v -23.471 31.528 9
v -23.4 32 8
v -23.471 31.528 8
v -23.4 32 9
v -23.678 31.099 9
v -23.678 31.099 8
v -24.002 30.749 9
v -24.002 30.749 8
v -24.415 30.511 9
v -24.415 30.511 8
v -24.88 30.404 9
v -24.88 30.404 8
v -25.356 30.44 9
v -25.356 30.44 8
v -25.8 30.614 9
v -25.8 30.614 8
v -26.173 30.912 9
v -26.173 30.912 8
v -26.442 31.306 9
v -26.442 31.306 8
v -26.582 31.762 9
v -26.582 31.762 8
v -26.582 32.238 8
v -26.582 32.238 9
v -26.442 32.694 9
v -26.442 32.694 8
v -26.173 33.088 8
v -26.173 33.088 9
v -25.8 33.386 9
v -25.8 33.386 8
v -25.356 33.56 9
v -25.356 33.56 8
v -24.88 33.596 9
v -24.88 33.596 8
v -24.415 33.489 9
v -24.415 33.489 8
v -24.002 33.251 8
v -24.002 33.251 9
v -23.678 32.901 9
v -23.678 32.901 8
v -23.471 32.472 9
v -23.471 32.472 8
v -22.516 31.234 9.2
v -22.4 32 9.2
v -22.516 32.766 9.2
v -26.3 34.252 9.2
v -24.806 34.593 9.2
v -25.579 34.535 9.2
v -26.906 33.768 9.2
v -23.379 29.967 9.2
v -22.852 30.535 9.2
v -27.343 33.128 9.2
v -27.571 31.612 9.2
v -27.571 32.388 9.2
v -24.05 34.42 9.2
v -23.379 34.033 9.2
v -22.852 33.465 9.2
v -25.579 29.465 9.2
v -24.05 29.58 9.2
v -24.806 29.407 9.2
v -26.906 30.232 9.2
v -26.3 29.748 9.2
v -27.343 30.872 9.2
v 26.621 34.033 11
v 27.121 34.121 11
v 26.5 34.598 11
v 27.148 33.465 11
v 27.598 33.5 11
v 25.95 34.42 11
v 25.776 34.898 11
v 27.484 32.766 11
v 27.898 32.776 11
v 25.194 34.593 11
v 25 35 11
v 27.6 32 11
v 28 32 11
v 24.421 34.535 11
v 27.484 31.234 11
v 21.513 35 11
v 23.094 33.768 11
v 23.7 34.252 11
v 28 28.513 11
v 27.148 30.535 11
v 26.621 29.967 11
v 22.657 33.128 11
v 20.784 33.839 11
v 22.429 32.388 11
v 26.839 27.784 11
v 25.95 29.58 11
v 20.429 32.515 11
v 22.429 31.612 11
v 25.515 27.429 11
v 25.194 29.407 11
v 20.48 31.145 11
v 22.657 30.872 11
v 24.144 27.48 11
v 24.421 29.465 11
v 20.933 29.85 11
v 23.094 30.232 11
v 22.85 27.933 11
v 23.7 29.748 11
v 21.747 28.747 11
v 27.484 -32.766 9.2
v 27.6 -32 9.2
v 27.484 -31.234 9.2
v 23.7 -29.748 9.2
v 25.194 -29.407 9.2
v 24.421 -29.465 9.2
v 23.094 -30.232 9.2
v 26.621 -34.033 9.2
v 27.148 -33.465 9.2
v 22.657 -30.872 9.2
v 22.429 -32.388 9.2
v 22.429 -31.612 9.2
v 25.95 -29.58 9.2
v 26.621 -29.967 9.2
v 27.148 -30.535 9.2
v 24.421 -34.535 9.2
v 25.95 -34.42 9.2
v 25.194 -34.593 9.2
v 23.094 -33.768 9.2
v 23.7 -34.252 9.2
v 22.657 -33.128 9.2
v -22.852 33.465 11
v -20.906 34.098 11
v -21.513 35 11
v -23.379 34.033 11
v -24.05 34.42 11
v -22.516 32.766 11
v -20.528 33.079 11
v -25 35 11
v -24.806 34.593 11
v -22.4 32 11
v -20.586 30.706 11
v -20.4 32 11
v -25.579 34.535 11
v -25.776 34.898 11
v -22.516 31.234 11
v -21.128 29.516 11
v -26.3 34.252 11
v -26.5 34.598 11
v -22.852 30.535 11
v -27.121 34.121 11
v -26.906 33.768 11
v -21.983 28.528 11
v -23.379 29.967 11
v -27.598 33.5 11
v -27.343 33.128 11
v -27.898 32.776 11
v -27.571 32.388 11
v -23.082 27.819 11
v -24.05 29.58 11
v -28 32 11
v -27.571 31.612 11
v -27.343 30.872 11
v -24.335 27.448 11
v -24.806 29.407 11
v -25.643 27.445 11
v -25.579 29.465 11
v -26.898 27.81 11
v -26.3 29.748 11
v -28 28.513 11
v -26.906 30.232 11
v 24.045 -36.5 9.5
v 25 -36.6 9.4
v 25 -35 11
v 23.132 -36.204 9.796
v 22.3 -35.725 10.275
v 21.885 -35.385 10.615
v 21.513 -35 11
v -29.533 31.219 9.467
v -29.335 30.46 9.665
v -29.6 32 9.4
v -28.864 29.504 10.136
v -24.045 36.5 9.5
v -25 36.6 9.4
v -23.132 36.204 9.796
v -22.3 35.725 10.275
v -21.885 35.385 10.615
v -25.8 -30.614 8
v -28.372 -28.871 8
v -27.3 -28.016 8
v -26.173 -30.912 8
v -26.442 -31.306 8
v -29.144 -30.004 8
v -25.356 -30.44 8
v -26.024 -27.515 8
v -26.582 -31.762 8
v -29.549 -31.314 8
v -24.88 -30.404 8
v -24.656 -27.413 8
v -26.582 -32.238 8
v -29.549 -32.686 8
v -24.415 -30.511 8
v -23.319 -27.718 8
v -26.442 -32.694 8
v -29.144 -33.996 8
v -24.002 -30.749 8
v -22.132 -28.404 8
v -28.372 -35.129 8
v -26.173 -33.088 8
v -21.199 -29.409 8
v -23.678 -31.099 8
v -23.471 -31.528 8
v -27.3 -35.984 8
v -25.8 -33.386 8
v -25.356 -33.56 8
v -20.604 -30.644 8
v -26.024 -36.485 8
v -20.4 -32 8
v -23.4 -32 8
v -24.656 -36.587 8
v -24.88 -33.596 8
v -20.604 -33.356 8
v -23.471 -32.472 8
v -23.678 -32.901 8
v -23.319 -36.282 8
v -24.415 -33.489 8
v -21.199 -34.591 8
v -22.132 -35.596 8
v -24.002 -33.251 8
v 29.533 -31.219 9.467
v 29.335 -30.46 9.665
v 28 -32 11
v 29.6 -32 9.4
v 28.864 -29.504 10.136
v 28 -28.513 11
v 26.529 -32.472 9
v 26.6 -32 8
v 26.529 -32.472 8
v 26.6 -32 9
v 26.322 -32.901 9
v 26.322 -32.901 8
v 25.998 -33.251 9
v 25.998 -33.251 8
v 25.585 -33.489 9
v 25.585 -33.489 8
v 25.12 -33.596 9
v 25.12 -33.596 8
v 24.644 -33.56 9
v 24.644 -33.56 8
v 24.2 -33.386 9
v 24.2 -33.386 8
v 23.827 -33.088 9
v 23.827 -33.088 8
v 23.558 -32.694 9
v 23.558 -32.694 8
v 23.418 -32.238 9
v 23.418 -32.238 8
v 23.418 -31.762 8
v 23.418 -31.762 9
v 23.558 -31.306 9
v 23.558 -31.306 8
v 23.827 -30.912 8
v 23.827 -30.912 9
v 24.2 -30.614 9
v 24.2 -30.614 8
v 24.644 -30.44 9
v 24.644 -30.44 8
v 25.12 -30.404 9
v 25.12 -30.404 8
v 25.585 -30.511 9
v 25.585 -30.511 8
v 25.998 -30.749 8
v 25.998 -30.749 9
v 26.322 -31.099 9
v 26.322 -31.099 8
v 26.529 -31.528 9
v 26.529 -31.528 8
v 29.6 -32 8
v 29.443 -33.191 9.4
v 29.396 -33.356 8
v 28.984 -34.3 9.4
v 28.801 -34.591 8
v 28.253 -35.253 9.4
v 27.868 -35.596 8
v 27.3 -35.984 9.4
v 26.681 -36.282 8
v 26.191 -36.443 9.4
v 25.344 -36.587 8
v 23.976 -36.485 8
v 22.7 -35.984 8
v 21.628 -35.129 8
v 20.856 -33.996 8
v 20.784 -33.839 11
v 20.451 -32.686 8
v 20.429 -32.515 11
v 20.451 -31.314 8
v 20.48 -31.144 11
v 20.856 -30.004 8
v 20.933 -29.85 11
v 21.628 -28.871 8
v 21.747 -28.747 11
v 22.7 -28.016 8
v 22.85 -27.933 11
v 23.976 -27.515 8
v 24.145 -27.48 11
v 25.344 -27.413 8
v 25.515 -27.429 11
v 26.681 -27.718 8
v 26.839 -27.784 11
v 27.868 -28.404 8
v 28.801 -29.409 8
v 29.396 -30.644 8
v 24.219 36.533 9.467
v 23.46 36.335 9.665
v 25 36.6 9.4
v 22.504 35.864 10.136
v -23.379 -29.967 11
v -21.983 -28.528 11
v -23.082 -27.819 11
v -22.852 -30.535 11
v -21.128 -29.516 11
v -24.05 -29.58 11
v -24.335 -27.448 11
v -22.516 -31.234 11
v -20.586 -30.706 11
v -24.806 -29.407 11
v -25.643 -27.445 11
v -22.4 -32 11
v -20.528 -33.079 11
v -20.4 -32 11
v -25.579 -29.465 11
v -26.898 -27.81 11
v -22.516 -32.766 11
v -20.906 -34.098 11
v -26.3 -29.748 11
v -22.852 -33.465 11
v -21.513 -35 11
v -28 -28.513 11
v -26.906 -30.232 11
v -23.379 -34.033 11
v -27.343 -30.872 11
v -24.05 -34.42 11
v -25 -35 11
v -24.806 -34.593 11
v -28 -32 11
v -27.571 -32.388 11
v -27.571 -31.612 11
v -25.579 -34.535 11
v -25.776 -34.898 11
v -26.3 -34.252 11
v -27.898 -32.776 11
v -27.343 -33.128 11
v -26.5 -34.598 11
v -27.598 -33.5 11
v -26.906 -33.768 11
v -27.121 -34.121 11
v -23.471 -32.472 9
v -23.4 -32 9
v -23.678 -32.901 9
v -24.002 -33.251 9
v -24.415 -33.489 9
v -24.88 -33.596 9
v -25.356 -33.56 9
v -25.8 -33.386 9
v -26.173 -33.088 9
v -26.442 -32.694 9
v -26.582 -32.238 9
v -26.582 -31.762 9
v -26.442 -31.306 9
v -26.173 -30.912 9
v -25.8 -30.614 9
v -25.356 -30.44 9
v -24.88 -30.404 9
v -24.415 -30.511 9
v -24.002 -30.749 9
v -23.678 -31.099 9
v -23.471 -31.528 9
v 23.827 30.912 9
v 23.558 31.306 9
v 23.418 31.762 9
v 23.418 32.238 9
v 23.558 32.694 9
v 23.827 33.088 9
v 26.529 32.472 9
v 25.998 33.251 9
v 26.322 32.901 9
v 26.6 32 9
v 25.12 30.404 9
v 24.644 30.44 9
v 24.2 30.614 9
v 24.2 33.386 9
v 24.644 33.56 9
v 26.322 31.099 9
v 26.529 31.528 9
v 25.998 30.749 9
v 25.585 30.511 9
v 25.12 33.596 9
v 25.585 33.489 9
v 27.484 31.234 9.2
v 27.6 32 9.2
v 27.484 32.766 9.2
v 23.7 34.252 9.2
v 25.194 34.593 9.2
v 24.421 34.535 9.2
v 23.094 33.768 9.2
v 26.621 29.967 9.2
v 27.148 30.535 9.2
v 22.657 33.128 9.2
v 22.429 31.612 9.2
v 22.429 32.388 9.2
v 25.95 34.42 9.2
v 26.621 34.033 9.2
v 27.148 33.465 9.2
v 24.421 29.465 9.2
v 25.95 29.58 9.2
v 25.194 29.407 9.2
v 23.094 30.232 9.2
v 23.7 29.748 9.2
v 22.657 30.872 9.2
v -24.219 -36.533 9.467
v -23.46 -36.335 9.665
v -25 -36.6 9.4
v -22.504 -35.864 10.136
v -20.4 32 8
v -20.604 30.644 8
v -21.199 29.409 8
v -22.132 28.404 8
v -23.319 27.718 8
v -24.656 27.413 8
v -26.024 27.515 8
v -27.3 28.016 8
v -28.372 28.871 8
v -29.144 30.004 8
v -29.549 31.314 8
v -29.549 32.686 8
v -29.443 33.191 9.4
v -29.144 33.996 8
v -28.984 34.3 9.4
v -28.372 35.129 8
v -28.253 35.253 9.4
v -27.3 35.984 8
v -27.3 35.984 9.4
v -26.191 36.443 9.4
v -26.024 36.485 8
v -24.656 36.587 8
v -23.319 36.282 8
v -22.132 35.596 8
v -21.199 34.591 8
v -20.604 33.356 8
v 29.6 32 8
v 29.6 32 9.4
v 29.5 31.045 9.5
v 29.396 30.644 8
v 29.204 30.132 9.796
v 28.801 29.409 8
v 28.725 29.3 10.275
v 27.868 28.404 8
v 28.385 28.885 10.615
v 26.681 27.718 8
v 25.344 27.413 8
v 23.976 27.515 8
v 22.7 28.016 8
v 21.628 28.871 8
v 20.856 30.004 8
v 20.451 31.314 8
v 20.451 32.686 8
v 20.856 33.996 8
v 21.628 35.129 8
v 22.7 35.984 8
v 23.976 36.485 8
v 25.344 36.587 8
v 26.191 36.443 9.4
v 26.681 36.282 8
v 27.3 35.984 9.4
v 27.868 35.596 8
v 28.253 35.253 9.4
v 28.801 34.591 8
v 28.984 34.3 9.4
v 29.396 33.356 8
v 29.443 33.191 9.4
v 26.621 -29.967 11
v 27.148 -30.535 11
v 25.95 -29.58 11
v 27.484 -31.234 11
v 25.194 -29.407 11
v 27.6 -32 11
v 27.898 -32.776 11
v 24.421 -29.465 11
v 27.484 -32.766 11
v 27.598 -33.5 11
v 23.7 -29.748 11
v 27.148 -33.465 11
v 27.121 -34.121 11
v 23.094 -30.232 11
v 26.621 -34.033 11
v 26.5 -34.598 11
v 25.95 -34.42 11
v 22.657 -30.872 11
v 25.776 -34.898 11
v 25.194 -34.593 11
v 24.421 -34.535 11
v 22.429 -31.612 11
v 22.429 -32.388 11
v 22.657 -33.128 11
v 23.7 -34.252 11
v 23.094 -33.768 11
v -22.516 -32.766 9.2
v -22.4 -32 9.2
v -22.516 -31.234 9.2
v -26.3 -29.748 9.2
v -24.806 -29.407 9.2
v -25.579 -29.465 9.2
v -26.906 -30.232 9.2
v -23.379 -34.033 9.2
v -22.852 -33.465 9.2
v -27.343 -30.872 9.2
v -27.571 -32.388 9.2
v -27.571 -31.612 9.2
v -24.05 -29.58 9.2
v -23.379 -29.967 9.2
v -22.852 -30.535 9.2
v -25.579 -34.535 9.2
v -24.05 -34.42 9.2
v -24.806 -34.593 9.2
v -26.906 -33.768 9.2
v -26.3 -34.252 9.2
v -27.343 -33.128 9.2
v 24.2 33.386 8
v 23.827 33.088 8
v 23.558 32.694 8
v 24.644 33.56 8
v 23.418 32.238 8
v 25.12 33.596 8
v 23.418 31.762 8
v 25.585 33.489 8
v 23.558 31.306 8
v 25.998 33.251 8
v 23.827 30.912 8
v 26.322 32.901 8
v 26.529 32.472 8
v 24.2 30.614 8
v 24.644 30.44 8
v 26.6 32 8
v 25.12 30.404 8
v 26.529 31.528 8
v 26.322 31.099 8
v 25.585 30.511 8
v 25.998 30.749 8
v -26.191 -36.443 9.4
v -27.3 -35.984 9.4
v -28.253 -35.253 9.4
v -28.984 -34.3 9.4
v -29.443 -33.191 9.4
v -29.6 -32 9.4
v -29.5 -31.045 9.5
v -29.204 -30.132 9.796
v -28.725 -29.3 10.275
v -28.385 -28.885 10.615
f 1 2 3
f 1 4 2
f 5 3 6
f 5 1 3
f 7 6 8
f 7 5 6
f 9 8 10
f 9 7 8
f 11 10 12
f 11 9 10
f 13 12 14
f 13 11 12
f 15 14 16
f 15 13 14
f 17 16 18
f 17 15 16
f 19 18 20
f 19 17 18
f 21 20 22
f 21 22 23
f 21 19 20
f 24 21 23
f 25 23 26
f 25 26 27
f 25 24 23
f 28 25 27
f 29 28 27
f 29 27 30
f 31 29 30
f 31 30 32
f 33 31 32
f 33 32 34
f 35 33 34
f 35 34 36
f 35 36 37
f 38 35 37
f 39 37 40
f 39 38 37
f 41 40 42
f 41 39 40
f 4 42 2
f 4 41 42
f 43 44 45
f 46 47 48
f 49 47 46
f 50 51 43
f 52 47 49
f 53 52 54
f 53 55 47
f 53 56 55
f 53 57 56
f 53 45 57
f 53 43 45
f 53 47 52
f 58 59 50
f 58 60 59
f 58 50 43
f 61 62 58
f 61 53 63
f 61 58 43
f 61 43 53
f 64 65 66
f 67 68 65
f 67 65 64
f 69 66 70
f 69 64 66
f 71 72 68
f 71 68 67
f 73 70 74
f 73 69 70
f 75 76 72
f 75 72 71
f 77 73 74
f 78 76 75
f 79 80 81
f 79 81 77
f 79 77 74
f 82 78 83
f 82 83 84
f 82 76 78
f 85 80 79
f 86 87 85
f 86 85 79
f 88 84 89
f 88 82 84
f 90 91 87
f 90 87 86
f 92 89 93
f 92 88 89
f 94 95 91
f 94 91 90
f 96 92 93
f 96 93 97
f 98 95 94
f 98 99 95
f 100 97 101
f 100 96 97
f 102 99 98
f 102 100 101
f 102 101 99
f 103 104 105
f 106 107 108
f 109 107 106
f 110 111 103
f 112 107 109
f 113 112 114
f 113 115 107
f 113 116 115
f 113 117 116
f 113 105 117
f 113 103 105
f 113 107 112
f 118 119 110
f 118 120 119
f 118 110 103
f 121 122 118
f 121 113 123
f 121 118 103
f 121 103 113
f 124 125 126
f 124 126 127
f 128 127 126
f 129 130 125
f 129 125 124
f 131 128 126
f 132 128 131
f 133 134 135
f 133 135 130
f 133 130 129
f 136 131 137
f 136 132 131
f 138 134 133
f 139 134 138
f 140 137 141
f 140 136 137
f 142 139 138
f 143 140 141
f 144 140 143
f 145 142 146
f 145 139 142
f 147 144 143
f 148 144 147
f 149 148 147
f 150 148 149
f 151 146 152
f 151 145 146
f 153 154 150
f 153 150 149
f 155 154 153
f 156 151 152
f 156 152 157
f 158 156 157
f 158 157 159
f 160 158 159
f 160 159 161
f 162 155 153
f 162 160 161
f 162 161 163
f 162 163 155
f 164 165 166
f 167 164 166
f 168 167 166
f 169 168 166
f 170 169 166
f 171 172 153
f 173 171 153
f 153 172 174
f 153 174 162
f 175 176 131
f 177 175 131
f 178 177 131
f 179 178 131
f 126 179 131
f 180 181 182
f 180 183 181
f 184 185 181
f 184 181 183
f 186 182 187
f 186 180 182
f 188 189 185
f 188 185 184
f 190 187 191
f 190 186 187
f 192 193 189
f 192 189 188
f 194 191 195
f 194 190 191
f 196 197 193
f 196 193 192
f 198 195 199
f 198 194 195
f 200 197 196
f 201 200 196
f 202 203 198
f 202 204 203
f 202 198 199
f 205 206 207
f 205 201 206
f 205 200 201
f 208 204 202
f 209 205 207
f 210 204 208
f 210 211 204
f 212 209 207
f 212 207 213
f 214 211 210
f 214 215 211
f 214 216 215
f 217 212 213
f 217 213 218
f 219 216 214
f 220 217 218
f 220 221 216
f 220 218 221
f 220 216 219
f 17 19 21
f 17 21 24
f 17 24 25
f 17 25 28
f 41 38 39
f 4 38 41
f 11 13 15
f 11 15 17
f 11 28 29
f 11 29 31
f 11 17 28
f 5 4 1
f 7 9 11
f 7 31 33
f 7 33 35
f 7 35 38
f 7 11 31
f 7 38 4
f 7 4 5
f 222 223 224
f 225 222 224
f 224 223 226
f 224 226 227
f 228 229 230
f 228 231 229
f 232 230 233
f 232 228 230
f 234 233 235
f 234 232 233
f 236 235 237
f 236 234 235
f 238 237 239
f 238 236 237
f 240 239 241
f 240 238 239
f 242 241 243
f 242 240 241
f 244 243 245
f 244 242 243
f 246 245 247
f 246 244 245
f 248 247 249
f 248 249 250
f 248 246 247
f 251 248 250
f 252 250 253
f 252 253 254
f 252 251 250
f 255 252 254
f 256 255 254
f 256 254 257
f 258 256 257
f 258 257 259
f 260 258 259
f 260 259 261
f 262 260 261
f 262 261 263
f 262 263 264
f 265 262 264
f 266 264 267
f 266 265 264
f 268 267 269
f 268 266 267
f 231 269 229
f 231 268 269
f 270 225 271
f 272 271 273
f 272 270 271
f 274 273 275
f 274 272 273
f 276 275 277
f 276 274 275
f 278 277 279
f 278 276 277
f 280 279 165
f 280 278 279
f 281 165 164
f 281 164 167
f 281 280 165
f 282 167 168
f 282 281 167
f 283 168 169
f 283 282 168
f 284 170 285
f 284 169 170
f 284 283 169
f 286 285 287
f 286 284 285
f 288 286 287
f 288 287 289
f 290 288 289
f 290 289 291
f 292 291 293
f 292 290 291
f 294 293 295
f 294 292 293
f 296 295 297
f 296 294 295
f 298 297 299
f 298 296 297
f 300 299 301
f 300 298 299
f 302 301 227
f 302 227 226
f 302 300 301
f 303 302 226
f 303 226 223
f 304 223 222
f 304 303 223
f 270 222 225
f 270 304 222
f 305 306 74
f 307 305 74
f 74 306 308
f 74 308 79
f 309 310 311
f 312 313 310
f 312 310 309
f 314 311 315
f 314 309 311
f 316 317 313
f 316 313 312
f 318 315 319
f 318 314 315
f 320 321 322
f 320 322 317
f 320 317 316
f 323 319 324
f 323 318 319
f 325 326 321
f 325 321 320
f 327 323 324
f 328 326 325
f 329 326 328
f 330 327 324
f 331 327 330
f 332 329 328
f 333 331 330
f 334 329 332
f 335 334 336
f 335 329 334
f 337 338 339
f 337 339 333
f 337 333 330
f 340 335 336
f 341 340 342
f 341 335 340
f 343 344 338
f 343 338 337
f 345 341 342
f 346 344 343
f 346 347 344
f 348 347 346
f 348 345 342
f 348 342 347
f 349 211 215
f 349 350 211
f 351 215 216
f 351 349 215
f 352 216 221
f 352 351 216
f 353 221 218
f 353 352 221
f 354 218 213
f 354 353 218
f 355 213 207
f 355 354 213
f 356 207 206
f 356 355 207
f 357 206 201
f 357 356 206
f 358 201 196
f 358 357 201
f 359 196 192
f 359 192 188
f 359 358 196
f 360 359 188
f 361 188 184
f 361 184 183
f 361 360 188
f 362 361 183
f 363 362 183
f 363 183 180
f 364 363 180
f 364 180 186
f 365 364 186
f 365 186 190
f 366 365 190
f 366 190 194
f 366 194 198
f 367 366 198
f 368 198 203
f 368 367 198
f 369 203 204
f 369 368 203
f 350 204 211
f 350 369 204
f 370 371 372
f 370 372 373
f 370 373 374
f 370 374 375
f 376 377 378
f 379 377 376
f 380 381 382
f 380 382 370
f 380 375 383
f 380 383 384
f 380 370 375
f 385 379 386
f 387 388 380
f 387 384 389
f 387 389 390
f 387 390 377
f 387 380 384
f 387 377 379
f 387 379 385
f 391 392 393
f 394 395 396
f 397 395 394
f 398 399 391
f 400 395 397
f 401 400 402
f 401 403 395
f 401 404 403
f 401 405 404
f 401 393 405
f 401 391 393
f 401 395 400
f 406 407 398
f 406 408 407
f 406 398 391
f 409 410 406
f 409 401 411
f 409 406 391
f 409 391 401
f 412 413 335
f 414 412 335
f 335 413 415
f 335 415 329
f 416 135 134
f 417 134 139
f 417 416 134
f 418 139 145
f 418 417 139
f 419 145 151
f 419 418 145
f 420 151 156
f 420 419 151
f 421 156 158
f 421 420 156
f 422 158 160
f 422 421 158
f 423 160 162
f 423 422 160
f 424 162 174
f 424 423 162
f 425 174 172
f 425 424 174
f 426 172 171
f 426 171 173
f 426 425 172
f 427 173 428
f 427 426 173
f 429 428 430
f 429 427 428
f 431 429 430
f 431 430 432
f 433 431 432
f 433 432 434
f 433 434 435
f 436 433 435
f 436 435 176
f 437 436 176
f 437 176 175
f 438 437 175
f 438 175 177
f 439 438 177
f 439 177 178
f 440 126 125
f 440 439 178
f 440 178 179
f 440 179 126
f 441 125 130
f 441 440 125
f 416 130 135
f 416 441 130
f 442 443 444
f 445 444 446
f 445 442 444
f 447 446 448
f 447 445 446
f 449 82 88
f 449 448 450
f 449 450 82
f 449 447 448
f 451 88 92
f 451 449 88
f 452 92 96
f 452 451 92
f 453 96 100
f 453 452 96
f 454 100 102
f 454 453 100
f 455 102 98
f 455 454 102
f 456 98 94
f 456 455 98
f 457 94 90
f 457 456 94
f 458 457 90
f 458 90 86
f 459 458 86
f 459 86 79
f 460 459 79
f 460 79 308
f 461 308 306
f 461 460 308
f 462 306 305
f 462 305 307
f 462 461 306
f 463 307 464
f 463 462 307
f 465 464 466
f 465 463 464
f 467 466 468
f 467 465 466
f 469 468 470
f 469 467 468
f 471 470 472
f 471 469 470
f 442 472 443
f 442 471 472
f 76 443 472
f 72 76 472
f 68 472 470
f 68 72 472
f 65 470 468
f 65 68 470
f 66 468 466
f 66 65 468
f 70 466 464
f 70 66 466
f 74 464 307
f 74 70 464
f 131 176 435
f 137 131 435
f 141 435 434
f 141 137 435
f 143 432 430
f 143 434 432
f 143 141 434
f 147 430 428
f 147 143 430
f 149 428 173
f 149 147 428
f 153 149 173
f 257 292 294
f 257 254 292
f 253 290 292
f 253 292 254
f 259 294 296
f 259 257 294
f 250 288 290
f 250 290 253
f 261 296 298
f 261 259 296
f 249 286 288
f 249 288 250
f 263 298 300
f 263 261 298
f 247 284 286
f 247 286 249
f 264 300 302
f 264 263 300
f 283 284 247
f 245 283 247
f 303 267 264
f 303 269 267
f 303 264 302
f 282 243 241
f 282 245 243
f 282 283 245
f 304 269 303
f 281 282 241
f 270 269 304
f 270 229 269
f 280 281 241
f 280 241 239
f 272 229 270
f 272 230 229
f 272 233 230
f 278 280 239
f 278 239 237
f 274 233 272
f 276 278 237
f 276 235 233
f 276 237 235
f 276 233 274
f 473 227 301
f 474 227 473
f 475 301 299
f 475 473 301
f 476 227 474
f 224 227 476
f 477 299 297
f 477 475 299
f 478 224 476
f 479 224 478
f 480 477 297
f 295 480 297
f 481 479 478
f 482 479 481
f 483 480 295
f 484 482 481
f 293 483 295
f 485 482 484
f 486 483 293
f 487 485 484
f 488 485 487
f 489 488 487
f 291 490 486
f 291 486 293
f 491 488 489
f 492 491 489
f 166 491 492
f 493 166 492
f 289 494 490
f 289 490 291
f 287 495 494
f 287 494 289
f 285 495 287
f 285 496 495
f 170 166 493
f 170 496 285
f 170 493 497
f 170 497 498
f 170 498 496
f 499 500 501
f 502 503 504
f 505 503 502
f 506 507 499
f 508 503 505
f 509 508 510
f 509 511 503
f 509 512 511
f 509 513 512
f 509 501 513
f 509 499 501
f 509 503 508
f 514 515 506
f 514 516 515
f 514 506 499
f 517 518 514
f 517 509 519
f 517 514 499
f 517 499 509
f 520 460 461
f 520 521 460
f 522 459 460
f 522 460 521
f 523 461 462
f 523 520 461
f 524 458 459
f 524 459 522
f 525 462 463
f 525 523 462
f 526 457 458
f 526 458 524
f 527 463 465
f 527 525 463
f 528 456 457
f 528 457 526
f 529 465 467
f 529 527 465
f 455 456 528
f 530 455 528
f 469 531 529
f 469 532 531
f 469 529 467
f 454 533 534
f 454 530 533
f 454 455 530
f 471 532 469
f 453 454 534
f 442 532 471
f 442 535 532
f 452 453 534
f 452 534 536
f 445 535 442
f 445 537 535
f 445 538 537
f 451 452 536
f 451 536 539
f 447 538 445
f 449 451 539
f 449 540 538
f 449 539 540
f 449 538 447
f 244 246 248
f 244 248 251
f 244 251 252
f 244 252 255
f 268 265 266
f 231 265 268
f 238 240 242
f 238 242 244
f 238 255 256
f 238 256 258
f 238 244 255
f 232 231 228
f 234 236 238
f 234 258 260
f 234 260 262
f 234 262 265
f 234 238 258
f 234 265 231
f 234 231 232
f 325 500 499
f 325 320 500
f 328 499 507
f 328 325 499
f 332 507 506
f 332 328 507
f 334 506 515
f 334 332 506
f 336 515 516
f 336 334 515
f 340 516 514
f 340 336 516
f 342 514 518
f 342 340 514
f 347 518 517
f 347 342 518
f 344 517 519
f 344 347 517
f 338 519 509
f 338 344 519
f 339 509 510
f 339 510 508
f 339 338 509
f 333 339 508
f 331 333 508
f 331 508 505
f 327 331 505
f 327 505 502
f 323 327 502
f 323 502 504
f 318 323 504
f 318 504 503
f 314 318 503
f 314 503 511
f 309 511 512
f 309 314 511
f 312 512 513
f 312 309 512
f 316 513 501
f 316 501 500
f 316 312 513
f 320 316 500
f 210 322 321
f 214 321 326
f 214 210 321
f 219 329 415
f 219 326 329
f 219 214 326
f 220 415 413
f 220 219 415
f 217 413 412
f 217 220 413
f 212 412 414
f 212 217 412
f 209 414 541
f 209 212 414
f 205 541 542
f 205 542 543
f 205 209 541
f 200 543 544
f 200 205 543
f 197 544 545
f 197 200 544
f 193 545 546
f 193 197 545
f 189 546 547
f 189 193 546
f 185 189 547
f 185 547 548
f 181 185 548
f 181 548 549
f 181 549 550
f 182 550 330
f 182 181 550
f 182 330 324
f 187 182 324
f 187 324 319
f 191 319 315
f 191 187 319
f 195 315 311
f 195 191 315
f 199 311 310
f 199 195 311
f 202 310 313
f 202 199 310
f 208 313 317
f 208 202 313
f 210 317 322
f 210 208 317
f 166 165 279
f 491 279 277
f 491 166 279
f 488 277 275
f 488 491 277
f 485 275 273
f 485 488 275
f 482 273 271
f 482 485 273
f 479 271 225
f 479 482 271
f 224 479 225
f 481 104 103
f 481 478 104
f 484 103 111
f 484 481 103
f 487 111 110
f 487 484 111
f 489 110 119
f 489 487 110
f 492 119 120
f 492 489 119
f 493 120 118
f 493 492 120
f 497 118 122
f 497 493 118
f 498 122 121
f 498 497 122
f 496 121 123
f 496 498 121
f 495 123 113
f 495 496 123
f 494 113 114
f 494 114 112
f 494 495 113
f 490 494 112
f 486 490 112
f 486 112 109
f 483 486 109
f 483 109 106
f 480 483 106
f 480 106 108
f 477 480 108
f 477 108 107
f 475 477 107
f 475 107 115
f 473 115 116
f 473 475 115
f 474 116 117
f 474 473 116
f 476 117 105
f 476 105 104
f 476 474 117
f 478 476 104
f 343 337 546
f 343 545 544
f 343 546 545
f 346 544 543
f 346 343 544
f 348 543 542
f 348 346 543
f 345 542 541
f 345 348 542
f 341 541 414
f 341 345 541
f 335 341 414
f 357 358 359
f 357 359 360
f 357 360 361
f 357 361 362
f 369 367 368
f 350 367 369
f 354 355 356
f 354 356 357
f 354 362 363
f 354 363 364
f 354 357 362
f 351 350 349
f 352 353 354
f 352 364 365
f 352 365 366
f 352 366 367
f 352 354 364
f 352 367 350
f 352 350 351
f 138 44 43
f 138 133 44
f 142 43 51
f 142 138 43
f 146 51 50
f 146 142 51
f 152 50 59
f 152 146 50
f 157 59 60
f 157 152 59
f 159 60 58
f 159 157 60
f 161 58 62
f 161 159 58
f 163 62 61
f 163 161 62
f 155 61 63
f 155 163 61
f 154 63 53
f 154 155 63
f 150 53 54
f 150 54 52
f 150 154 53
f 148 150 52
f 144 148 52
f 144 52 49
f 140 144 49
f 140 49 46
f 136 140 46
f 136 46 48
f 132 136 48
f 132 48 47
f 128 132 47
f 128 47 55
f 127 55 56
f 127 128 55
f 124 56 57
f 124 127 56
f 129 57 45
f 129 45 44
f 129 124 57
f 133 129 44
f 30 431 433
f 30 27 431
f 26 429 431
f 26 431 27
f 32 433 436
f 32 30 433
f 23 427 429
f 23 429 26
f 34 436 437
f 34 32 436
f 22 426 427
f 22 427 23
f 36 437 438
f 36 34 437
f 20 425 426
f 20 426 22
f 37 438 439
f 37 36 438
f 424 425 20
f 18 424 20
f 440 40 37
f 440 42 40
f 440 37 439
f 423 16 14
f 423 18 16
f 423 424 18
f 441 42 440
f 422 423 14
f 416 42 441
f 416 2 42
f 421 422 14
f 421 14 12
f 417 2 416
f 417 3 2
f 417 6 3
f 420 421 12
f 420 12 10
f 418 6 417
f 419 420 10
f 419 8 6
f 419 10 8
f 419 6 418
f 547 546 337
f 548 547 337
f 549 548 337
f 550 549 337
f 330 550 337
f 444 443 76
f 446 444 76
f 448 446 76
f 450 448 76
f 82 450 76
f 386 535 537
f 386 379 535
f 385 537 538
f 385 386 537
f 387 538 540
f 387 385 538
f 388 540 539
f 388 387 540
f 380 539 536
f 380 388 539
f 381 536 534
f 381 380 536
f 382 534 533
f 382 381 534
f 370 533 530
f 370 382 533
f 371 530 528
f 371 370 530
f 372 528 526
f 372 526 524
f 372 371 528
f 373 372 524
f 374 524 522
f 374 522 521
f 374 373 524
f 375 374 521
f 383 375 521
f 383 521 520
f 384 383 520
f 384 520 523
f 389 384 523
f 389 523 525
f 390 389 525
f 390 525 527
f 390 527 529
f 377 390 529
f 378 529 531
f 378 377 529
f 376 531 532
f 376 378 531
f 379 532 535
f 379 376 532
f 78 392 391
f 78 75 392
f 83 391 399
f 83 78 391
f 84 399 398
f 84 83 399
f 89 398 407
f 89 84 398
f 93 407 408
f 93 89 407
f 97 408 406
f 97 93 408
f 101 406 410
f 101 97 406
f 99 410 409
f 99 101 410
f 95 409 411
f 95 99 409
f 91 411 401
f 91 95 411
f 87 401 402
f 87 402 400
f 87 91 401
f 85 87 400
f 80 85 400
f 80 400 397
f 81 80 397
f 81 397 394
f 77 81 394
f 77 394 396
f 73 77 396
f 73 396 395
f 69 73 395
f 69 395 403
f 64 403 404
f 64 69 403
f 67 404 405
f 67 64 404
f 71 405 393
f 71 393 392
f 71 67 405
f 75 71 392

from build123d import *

# Parameters (mm, degrees)
REVOLVE_PLACEMENT_ANGLE = 180


with BuildPart() as bevel005:
    # Sweep002: sweep along a path in Sketch041
    with BuildLine(Plane(origin=(0, 0, -2), x_dir=(1, 0, 0), z_dir=(0, 0, -1))) as sweep002_path:
        Line((-25, 35), (25, 35))
        ThreePointArc((25, 35), (27.12132, 34.12132), (28, 32))
        Line((28, 32), (28, -32))
        ThreePointArc((28, -32), (27.12132, -34.12132), (25, -35))
        Line((25, -35), (-25, -35))
        ThreePointArc((-25, -35), (-27.12132, -34.12132), (-28, -32))
        Line((-28, -32), (-28, 32))
        ThreePointArc((-28, 32), (-27.12132, 34.12132), (-25, 35))
    # Sketch040 → Sweep002 (sweep)
    with BuildSketch(Plane.XZ):
        Polygon((-28, 11), (-30, 9), (-30, 1), (-28, -1), (-28, -2), (-33, -2), (-33, 12), (-28, 12), align=None)
    sweep(path=sweep002_path.line)


with BuildPart() as screw_hole_bottom:
    # Sketch033 → Revolve (revolve)
    with BuildSketch(Plane.XZ):
        Polygon((1.6, 3), (1.6, 2), (0, 2), (0, 1.8), (2.6, 1.8), (2.6, 0), (4.6, 0), (4.6, 3), align=None)
    revolve(axis=Axis((0, 0, 0), (0, 0, 1)))


with BuildPart() as screw_hole_bottom_1:
    # Revolve placement: moved
    add(screw_hole_bottom.part.moved(Location((-25, 32, 11))).rotate(Axis((-25, 32, 11), (1, 0, 0)), REVOLVE_PLACEMENT_ANGLE))


with BuildPart() as screw_hole_bottom002:
    # Body012 base: copy of screw hole bottom
    add(screw_hole_bottom_1.part)


with BuildPart() as screw_hole_bottom002_1:
    # Clone012 placement: moved
    add(screw_hole_bottom002.part.moved(Location((25, -32, 0))))


with BuildPart() as screw_hole_bottom002_2:
    # Body012 placement: moved
    add(screw_hole_bottom002_1.part.moved(Location((-25, -32, 0))))


with BuildPart() as screw_hole_bottom001:
    # Body011 base: copy of screw hole bottom
    add(screw_hole_bottom_1.part)


with BuildPart() as screw_hole_bottom001_1:
    # Clone011 placement: moved
    add(screw_hole_bottom001.part.moved(Location((25, -32, 0))))


with BuildPart() as screw_hole_bottom001_2:
    # Body011 placement: moved
    add(screw_hole_bottom001_1.part.moved(Location((25, -32, 0))))


with BuildPart() as cut030:
    # Body013 base: copy of screw hole bottom
    add(screw_hole_bottom_1.part)


with BuildPart() as cut030_1:
    # Clone013 placement: moved
    add(cut030.part.moved(Location((25, -32, 0))))


with BuildPart() as cut030_2:
    # Body013 placement: moved
    add(cut030_1.part.moved(Location((25, 32, 0))))

    # Fusion027: union screw hole bottom002, screw hole bottom, screw hole bottom001
    add(screw_hole_bottom002_2.part)
    add(screw_hole_bottom_1.part)
    add(screw_hole_bottom001_2.part)

    # Cut030: cut bevel005
    add(bevel005.part, mode=Mode.SUBTRACT)


solid = cut030_2.part
